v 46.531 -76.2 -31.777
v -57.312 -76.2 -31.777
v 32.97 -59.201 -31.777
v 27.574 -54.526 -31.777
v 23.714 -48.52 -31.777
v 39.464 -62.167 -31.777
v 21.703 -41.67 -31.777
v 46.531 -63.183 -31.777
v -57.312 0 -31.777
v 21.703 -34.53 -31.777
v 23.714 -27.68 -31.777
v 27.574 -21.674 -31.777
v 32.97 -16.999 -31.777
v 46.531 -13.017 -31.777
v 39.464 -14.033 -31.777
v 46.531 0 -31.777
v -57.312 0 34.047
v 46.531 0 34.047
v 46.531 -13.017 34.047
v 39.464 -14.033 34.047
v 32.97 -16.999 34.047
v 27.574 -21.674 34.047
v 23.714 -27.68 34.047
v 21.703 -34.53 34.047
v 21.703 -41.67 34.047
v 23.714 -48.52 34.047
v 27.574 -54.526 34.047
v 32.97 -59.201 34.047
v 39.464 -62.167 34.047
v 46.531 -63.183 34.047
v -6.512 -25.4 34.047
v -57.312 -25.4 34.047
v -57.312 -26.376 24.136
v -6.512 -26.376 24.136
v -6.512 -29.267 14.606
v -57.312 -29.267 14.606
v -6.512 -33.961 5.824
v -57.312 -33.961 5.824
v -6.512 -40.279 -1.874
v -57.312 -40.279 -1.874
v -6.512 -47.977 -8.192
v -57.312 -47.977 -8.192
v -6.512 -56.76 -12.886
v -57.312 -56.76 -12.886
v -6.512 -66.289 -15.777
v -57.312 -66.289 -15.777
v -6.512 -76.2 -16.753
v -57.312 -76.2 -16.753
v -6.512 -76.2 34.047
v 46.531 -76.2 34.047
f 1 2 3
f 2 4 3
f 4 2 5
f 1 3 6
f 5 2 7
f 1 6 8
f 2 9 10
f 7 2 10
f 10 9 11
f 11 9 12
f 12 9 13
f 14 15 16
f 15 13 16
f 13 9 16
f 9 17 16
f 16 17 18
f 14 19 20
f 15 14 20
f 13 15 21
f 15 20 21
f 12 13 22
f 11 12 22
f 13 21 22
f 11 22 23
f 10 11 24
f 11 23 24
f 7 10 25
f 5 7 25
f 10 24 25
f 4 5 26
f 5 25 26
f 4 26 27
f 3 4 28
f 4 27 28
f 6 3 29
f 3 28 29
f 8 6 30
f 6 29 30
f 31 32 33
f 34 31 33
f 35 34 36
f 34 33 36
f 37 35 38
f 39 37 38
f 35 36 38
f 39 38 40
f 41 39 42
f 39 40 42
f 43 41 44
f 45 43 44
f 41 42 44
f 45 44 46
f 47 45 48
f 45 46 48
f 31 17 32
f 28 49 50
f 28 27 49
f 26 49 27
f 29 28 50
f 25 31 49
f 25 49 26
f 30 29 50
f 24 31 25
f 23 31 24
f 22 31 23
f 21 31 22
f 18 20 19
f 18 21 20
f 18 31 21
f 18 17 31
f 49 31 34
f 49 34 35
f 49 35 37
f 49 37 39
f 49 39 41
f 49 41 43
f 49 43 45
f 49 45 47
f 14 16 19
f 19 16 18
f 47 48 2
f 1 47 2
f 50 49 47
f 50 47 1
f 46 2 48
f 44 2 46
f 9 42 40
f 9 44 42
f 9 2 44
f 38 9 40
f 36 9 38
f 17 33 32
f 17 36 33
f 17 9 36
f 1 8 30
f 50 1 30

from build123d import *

# Parameters (mm, degrees)
F0_W     = 103.8427650928
F0_H     = 65.8238306642
F1_DEPTH = 76.2
F3_DEPTH = 69.596
F5_DEPTH = 50.8


with BuildPart() as f1:
    # F0 (on Front) → F1 (new body)
    with BuildSketch(Plane.XZ):
        with Locations((-5.3907446563, 1.1348947883)):
            Rectangle(F0_W, F0_H)
    extrude(amount=F1_DEPTH)

    # F2 (on face) → F3 (cut)
    with BuildSketch(Plane.XY.offset(34.0468101203)):
        with BuildLine():
            Line((46.5306378901, -63.1833607248), (46.5306378901, -13.0166392752))
            ThreePointArc((46.5306378901, -13.0166392752), (21.4472771653, -38.1), (46.5306378901, -63.1833607248))
        make_face()
    extrude(amount=-F3_DEPTH, mode=Mode.SUBTRACT)

    # F4 (on face) → F5 (cut)
    with BuildSketch(Plane(origin=(-57.3121272027, 0, 0), x_dir=(0, -1, 0), z_dir=(-1, 0, 0))):
        with BuildLine():
            ThreePointArc((25.4, 34.0468101203), (40.2789755157, -1.8742143639), (76.2, -16.7531898797))
            Line((76.2, -16.7531898797), (76.2, 34.0468101203))
            Line((76.2, 34.0468101203), (25.4, 34.0468101203))
        make_face()
    extrude(amount=-F5_DEPTH, mode=Mode.SUBTRACT)


solid = f1.part
